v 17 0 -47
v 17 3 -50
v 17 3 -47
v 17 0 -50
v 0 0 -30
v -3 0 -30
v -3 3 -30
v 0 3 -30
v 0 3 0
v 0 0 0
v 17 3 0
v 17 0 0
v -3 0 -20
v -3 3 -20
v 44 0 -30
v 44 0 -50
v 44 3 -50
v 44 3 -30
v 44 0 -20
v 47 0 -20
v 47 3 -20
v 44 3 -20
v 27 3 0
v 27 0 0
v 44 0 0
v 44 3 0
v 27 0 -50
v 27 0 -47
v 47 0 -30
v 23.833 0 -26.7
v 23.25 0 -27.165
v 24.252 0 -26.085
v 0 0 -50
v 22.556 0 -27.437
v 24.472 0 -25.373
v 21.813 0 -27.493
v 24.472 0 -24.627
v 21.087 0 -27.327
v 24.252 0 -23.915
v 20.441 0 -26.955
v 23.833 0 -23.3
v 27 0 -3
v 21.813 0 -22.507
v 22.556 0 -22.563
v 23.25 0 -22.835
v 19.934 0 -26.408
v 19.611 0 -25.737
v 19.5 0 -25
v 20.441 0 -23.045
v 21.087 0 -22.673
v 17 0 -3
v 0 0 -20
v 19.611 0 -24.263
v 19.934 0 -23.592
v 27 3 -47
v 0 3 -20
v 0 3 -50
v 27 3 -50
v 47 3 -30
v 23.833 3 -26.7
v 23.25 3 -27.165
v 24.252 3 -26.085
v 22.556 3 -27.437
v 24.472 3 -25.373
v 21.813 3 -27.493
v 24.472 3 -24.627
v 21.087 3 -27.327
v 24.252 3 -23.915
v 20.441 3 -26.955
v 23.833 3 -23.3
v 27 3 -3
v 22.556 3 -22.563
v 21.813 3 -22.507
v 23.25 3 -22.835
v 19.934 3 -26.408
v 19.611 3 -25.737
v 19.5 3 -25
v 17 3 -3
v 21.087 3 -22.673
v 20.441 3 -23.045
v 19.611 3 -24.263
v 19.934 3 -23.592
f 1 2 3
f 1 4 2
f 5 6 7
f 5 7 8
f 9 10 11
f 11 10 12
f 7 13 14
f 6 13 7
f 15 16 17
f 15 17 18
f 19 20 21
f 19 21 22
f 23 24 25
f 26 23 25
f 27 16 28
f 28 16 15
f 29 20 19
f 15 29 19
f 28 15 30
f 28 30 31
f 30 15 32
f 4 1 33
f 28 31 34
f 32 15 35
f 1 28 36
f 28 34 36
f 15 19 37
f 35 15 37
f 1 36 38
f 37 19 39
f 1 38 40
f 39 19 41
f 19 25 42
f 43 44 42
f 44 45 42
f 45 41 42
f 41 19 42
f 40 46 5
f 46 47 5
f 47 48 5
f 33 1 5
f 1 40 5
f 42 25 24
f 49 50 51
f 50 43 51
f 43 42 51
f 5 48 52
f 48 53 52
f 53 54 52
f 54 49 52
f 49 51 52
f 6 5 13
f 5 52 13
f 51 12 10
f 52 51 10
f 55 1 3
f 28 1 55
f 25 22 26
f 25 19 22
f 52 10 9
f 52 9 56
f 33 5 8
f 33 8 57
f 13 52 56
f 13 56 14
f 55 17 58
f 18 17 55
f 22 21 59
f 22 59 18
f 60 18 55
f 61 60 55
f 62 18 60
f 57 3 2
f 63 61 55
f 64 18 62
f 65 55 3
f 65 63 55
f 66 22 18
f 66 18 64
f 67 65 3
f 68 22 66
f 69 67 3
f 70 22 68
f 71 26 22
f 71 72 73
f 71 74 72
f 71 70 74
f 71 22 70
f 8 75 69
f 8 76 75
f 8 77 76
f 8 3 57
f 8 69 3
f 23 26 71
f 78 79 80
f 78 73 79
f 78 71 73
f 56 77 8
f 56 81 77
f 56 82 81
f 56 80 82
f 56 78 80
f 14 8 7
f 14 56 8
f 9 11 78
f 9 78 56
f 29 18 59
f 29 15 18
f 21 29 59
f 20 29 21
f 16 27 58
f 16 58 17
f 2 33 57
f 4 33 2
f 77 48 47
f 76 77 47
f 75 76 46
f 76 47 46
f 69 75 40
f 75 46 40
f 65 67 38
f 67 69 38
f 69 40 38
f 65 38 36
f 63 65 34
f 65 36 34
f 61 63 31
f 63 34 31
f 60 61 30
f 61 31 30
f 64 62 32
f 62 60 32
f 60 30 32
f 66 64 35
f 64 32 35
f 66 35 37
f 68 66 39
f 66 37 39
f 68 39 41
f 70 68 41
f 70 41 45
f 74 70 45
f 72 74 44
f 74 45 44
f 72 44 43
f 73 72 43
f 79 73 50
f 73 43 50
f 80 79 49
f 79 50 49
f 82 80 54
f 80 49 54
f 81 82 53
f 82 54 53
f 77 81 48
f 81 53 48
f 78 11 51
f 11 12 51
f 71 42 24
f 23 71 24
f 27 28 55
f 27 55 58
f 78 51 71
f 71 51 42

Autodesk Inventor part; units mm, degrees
ref_plane "YZ Plane" through (0, 0, 0) normal (1, 0, 0) x (0, 1, 0)
ref_plane "XZ Plane" through (0, 0, 0) normal (0, 1, 0) x (-1, 0, 0)
ref_plane "XY Plane" through (0, 0, 0) normal (0, 0, 1) x (1, 0, 0)
sketch "Sketch1" plane through (0, 0, 0) normal (0, 1, 0) x (-1, 0, 0)
  line L0 (0, 0) -> (0, -20)
  line L1 (0, -20) -> (3, -20)
  line L2 (3, -20) -> (3, -30)
  line L3 (3, -30) -> (0, -30)
  line L4 (0, -30) -> (0, -50)
  line L5 (0, -50) -> (-17, -50)
  line L6 (-17, -50) -> (-17, -47)
  line L7 (-17, -47) -> (-27, -47)
  line L8 (-27, -47) -> (-27, -50)
  line L9 (-27, -50) -> (-44, -50)
  line L10 (-44, -50) -> (-44, -30)
  line L11 (-44, -30) -> (-47, -30)
  line L12 (-47, -30) -> (-47, -20)
  line L13 (-47, -20) -> (-44, -20)
  line L14 (-44, -20) -> (-44, 0)
  line L15 (0, 0) -> (-17, 0)
  line L16 (-17, 0) -> (-17, -3)
  line L17 (-17, -3) -> (-27, -3)
  line L18 (-27, -3) -> (-27, 0)
  line L19 (-27, 0) -> (-44, 0)
  circle A0 centre (-22, -25) radius 2.5
  point P0 (3, -25)
  point P1 (-22, -3)
  dimension "d5" = 3
  dimension "d7" = 10
  dimension "d8" = 3
  dimension "d9" = 50
  dimension "d10" = 10
  dimension "d11" = 50
  dimension "d14" = 5
extrude "Extrusion2" add sketch "Sketch1" along normal blind 3
